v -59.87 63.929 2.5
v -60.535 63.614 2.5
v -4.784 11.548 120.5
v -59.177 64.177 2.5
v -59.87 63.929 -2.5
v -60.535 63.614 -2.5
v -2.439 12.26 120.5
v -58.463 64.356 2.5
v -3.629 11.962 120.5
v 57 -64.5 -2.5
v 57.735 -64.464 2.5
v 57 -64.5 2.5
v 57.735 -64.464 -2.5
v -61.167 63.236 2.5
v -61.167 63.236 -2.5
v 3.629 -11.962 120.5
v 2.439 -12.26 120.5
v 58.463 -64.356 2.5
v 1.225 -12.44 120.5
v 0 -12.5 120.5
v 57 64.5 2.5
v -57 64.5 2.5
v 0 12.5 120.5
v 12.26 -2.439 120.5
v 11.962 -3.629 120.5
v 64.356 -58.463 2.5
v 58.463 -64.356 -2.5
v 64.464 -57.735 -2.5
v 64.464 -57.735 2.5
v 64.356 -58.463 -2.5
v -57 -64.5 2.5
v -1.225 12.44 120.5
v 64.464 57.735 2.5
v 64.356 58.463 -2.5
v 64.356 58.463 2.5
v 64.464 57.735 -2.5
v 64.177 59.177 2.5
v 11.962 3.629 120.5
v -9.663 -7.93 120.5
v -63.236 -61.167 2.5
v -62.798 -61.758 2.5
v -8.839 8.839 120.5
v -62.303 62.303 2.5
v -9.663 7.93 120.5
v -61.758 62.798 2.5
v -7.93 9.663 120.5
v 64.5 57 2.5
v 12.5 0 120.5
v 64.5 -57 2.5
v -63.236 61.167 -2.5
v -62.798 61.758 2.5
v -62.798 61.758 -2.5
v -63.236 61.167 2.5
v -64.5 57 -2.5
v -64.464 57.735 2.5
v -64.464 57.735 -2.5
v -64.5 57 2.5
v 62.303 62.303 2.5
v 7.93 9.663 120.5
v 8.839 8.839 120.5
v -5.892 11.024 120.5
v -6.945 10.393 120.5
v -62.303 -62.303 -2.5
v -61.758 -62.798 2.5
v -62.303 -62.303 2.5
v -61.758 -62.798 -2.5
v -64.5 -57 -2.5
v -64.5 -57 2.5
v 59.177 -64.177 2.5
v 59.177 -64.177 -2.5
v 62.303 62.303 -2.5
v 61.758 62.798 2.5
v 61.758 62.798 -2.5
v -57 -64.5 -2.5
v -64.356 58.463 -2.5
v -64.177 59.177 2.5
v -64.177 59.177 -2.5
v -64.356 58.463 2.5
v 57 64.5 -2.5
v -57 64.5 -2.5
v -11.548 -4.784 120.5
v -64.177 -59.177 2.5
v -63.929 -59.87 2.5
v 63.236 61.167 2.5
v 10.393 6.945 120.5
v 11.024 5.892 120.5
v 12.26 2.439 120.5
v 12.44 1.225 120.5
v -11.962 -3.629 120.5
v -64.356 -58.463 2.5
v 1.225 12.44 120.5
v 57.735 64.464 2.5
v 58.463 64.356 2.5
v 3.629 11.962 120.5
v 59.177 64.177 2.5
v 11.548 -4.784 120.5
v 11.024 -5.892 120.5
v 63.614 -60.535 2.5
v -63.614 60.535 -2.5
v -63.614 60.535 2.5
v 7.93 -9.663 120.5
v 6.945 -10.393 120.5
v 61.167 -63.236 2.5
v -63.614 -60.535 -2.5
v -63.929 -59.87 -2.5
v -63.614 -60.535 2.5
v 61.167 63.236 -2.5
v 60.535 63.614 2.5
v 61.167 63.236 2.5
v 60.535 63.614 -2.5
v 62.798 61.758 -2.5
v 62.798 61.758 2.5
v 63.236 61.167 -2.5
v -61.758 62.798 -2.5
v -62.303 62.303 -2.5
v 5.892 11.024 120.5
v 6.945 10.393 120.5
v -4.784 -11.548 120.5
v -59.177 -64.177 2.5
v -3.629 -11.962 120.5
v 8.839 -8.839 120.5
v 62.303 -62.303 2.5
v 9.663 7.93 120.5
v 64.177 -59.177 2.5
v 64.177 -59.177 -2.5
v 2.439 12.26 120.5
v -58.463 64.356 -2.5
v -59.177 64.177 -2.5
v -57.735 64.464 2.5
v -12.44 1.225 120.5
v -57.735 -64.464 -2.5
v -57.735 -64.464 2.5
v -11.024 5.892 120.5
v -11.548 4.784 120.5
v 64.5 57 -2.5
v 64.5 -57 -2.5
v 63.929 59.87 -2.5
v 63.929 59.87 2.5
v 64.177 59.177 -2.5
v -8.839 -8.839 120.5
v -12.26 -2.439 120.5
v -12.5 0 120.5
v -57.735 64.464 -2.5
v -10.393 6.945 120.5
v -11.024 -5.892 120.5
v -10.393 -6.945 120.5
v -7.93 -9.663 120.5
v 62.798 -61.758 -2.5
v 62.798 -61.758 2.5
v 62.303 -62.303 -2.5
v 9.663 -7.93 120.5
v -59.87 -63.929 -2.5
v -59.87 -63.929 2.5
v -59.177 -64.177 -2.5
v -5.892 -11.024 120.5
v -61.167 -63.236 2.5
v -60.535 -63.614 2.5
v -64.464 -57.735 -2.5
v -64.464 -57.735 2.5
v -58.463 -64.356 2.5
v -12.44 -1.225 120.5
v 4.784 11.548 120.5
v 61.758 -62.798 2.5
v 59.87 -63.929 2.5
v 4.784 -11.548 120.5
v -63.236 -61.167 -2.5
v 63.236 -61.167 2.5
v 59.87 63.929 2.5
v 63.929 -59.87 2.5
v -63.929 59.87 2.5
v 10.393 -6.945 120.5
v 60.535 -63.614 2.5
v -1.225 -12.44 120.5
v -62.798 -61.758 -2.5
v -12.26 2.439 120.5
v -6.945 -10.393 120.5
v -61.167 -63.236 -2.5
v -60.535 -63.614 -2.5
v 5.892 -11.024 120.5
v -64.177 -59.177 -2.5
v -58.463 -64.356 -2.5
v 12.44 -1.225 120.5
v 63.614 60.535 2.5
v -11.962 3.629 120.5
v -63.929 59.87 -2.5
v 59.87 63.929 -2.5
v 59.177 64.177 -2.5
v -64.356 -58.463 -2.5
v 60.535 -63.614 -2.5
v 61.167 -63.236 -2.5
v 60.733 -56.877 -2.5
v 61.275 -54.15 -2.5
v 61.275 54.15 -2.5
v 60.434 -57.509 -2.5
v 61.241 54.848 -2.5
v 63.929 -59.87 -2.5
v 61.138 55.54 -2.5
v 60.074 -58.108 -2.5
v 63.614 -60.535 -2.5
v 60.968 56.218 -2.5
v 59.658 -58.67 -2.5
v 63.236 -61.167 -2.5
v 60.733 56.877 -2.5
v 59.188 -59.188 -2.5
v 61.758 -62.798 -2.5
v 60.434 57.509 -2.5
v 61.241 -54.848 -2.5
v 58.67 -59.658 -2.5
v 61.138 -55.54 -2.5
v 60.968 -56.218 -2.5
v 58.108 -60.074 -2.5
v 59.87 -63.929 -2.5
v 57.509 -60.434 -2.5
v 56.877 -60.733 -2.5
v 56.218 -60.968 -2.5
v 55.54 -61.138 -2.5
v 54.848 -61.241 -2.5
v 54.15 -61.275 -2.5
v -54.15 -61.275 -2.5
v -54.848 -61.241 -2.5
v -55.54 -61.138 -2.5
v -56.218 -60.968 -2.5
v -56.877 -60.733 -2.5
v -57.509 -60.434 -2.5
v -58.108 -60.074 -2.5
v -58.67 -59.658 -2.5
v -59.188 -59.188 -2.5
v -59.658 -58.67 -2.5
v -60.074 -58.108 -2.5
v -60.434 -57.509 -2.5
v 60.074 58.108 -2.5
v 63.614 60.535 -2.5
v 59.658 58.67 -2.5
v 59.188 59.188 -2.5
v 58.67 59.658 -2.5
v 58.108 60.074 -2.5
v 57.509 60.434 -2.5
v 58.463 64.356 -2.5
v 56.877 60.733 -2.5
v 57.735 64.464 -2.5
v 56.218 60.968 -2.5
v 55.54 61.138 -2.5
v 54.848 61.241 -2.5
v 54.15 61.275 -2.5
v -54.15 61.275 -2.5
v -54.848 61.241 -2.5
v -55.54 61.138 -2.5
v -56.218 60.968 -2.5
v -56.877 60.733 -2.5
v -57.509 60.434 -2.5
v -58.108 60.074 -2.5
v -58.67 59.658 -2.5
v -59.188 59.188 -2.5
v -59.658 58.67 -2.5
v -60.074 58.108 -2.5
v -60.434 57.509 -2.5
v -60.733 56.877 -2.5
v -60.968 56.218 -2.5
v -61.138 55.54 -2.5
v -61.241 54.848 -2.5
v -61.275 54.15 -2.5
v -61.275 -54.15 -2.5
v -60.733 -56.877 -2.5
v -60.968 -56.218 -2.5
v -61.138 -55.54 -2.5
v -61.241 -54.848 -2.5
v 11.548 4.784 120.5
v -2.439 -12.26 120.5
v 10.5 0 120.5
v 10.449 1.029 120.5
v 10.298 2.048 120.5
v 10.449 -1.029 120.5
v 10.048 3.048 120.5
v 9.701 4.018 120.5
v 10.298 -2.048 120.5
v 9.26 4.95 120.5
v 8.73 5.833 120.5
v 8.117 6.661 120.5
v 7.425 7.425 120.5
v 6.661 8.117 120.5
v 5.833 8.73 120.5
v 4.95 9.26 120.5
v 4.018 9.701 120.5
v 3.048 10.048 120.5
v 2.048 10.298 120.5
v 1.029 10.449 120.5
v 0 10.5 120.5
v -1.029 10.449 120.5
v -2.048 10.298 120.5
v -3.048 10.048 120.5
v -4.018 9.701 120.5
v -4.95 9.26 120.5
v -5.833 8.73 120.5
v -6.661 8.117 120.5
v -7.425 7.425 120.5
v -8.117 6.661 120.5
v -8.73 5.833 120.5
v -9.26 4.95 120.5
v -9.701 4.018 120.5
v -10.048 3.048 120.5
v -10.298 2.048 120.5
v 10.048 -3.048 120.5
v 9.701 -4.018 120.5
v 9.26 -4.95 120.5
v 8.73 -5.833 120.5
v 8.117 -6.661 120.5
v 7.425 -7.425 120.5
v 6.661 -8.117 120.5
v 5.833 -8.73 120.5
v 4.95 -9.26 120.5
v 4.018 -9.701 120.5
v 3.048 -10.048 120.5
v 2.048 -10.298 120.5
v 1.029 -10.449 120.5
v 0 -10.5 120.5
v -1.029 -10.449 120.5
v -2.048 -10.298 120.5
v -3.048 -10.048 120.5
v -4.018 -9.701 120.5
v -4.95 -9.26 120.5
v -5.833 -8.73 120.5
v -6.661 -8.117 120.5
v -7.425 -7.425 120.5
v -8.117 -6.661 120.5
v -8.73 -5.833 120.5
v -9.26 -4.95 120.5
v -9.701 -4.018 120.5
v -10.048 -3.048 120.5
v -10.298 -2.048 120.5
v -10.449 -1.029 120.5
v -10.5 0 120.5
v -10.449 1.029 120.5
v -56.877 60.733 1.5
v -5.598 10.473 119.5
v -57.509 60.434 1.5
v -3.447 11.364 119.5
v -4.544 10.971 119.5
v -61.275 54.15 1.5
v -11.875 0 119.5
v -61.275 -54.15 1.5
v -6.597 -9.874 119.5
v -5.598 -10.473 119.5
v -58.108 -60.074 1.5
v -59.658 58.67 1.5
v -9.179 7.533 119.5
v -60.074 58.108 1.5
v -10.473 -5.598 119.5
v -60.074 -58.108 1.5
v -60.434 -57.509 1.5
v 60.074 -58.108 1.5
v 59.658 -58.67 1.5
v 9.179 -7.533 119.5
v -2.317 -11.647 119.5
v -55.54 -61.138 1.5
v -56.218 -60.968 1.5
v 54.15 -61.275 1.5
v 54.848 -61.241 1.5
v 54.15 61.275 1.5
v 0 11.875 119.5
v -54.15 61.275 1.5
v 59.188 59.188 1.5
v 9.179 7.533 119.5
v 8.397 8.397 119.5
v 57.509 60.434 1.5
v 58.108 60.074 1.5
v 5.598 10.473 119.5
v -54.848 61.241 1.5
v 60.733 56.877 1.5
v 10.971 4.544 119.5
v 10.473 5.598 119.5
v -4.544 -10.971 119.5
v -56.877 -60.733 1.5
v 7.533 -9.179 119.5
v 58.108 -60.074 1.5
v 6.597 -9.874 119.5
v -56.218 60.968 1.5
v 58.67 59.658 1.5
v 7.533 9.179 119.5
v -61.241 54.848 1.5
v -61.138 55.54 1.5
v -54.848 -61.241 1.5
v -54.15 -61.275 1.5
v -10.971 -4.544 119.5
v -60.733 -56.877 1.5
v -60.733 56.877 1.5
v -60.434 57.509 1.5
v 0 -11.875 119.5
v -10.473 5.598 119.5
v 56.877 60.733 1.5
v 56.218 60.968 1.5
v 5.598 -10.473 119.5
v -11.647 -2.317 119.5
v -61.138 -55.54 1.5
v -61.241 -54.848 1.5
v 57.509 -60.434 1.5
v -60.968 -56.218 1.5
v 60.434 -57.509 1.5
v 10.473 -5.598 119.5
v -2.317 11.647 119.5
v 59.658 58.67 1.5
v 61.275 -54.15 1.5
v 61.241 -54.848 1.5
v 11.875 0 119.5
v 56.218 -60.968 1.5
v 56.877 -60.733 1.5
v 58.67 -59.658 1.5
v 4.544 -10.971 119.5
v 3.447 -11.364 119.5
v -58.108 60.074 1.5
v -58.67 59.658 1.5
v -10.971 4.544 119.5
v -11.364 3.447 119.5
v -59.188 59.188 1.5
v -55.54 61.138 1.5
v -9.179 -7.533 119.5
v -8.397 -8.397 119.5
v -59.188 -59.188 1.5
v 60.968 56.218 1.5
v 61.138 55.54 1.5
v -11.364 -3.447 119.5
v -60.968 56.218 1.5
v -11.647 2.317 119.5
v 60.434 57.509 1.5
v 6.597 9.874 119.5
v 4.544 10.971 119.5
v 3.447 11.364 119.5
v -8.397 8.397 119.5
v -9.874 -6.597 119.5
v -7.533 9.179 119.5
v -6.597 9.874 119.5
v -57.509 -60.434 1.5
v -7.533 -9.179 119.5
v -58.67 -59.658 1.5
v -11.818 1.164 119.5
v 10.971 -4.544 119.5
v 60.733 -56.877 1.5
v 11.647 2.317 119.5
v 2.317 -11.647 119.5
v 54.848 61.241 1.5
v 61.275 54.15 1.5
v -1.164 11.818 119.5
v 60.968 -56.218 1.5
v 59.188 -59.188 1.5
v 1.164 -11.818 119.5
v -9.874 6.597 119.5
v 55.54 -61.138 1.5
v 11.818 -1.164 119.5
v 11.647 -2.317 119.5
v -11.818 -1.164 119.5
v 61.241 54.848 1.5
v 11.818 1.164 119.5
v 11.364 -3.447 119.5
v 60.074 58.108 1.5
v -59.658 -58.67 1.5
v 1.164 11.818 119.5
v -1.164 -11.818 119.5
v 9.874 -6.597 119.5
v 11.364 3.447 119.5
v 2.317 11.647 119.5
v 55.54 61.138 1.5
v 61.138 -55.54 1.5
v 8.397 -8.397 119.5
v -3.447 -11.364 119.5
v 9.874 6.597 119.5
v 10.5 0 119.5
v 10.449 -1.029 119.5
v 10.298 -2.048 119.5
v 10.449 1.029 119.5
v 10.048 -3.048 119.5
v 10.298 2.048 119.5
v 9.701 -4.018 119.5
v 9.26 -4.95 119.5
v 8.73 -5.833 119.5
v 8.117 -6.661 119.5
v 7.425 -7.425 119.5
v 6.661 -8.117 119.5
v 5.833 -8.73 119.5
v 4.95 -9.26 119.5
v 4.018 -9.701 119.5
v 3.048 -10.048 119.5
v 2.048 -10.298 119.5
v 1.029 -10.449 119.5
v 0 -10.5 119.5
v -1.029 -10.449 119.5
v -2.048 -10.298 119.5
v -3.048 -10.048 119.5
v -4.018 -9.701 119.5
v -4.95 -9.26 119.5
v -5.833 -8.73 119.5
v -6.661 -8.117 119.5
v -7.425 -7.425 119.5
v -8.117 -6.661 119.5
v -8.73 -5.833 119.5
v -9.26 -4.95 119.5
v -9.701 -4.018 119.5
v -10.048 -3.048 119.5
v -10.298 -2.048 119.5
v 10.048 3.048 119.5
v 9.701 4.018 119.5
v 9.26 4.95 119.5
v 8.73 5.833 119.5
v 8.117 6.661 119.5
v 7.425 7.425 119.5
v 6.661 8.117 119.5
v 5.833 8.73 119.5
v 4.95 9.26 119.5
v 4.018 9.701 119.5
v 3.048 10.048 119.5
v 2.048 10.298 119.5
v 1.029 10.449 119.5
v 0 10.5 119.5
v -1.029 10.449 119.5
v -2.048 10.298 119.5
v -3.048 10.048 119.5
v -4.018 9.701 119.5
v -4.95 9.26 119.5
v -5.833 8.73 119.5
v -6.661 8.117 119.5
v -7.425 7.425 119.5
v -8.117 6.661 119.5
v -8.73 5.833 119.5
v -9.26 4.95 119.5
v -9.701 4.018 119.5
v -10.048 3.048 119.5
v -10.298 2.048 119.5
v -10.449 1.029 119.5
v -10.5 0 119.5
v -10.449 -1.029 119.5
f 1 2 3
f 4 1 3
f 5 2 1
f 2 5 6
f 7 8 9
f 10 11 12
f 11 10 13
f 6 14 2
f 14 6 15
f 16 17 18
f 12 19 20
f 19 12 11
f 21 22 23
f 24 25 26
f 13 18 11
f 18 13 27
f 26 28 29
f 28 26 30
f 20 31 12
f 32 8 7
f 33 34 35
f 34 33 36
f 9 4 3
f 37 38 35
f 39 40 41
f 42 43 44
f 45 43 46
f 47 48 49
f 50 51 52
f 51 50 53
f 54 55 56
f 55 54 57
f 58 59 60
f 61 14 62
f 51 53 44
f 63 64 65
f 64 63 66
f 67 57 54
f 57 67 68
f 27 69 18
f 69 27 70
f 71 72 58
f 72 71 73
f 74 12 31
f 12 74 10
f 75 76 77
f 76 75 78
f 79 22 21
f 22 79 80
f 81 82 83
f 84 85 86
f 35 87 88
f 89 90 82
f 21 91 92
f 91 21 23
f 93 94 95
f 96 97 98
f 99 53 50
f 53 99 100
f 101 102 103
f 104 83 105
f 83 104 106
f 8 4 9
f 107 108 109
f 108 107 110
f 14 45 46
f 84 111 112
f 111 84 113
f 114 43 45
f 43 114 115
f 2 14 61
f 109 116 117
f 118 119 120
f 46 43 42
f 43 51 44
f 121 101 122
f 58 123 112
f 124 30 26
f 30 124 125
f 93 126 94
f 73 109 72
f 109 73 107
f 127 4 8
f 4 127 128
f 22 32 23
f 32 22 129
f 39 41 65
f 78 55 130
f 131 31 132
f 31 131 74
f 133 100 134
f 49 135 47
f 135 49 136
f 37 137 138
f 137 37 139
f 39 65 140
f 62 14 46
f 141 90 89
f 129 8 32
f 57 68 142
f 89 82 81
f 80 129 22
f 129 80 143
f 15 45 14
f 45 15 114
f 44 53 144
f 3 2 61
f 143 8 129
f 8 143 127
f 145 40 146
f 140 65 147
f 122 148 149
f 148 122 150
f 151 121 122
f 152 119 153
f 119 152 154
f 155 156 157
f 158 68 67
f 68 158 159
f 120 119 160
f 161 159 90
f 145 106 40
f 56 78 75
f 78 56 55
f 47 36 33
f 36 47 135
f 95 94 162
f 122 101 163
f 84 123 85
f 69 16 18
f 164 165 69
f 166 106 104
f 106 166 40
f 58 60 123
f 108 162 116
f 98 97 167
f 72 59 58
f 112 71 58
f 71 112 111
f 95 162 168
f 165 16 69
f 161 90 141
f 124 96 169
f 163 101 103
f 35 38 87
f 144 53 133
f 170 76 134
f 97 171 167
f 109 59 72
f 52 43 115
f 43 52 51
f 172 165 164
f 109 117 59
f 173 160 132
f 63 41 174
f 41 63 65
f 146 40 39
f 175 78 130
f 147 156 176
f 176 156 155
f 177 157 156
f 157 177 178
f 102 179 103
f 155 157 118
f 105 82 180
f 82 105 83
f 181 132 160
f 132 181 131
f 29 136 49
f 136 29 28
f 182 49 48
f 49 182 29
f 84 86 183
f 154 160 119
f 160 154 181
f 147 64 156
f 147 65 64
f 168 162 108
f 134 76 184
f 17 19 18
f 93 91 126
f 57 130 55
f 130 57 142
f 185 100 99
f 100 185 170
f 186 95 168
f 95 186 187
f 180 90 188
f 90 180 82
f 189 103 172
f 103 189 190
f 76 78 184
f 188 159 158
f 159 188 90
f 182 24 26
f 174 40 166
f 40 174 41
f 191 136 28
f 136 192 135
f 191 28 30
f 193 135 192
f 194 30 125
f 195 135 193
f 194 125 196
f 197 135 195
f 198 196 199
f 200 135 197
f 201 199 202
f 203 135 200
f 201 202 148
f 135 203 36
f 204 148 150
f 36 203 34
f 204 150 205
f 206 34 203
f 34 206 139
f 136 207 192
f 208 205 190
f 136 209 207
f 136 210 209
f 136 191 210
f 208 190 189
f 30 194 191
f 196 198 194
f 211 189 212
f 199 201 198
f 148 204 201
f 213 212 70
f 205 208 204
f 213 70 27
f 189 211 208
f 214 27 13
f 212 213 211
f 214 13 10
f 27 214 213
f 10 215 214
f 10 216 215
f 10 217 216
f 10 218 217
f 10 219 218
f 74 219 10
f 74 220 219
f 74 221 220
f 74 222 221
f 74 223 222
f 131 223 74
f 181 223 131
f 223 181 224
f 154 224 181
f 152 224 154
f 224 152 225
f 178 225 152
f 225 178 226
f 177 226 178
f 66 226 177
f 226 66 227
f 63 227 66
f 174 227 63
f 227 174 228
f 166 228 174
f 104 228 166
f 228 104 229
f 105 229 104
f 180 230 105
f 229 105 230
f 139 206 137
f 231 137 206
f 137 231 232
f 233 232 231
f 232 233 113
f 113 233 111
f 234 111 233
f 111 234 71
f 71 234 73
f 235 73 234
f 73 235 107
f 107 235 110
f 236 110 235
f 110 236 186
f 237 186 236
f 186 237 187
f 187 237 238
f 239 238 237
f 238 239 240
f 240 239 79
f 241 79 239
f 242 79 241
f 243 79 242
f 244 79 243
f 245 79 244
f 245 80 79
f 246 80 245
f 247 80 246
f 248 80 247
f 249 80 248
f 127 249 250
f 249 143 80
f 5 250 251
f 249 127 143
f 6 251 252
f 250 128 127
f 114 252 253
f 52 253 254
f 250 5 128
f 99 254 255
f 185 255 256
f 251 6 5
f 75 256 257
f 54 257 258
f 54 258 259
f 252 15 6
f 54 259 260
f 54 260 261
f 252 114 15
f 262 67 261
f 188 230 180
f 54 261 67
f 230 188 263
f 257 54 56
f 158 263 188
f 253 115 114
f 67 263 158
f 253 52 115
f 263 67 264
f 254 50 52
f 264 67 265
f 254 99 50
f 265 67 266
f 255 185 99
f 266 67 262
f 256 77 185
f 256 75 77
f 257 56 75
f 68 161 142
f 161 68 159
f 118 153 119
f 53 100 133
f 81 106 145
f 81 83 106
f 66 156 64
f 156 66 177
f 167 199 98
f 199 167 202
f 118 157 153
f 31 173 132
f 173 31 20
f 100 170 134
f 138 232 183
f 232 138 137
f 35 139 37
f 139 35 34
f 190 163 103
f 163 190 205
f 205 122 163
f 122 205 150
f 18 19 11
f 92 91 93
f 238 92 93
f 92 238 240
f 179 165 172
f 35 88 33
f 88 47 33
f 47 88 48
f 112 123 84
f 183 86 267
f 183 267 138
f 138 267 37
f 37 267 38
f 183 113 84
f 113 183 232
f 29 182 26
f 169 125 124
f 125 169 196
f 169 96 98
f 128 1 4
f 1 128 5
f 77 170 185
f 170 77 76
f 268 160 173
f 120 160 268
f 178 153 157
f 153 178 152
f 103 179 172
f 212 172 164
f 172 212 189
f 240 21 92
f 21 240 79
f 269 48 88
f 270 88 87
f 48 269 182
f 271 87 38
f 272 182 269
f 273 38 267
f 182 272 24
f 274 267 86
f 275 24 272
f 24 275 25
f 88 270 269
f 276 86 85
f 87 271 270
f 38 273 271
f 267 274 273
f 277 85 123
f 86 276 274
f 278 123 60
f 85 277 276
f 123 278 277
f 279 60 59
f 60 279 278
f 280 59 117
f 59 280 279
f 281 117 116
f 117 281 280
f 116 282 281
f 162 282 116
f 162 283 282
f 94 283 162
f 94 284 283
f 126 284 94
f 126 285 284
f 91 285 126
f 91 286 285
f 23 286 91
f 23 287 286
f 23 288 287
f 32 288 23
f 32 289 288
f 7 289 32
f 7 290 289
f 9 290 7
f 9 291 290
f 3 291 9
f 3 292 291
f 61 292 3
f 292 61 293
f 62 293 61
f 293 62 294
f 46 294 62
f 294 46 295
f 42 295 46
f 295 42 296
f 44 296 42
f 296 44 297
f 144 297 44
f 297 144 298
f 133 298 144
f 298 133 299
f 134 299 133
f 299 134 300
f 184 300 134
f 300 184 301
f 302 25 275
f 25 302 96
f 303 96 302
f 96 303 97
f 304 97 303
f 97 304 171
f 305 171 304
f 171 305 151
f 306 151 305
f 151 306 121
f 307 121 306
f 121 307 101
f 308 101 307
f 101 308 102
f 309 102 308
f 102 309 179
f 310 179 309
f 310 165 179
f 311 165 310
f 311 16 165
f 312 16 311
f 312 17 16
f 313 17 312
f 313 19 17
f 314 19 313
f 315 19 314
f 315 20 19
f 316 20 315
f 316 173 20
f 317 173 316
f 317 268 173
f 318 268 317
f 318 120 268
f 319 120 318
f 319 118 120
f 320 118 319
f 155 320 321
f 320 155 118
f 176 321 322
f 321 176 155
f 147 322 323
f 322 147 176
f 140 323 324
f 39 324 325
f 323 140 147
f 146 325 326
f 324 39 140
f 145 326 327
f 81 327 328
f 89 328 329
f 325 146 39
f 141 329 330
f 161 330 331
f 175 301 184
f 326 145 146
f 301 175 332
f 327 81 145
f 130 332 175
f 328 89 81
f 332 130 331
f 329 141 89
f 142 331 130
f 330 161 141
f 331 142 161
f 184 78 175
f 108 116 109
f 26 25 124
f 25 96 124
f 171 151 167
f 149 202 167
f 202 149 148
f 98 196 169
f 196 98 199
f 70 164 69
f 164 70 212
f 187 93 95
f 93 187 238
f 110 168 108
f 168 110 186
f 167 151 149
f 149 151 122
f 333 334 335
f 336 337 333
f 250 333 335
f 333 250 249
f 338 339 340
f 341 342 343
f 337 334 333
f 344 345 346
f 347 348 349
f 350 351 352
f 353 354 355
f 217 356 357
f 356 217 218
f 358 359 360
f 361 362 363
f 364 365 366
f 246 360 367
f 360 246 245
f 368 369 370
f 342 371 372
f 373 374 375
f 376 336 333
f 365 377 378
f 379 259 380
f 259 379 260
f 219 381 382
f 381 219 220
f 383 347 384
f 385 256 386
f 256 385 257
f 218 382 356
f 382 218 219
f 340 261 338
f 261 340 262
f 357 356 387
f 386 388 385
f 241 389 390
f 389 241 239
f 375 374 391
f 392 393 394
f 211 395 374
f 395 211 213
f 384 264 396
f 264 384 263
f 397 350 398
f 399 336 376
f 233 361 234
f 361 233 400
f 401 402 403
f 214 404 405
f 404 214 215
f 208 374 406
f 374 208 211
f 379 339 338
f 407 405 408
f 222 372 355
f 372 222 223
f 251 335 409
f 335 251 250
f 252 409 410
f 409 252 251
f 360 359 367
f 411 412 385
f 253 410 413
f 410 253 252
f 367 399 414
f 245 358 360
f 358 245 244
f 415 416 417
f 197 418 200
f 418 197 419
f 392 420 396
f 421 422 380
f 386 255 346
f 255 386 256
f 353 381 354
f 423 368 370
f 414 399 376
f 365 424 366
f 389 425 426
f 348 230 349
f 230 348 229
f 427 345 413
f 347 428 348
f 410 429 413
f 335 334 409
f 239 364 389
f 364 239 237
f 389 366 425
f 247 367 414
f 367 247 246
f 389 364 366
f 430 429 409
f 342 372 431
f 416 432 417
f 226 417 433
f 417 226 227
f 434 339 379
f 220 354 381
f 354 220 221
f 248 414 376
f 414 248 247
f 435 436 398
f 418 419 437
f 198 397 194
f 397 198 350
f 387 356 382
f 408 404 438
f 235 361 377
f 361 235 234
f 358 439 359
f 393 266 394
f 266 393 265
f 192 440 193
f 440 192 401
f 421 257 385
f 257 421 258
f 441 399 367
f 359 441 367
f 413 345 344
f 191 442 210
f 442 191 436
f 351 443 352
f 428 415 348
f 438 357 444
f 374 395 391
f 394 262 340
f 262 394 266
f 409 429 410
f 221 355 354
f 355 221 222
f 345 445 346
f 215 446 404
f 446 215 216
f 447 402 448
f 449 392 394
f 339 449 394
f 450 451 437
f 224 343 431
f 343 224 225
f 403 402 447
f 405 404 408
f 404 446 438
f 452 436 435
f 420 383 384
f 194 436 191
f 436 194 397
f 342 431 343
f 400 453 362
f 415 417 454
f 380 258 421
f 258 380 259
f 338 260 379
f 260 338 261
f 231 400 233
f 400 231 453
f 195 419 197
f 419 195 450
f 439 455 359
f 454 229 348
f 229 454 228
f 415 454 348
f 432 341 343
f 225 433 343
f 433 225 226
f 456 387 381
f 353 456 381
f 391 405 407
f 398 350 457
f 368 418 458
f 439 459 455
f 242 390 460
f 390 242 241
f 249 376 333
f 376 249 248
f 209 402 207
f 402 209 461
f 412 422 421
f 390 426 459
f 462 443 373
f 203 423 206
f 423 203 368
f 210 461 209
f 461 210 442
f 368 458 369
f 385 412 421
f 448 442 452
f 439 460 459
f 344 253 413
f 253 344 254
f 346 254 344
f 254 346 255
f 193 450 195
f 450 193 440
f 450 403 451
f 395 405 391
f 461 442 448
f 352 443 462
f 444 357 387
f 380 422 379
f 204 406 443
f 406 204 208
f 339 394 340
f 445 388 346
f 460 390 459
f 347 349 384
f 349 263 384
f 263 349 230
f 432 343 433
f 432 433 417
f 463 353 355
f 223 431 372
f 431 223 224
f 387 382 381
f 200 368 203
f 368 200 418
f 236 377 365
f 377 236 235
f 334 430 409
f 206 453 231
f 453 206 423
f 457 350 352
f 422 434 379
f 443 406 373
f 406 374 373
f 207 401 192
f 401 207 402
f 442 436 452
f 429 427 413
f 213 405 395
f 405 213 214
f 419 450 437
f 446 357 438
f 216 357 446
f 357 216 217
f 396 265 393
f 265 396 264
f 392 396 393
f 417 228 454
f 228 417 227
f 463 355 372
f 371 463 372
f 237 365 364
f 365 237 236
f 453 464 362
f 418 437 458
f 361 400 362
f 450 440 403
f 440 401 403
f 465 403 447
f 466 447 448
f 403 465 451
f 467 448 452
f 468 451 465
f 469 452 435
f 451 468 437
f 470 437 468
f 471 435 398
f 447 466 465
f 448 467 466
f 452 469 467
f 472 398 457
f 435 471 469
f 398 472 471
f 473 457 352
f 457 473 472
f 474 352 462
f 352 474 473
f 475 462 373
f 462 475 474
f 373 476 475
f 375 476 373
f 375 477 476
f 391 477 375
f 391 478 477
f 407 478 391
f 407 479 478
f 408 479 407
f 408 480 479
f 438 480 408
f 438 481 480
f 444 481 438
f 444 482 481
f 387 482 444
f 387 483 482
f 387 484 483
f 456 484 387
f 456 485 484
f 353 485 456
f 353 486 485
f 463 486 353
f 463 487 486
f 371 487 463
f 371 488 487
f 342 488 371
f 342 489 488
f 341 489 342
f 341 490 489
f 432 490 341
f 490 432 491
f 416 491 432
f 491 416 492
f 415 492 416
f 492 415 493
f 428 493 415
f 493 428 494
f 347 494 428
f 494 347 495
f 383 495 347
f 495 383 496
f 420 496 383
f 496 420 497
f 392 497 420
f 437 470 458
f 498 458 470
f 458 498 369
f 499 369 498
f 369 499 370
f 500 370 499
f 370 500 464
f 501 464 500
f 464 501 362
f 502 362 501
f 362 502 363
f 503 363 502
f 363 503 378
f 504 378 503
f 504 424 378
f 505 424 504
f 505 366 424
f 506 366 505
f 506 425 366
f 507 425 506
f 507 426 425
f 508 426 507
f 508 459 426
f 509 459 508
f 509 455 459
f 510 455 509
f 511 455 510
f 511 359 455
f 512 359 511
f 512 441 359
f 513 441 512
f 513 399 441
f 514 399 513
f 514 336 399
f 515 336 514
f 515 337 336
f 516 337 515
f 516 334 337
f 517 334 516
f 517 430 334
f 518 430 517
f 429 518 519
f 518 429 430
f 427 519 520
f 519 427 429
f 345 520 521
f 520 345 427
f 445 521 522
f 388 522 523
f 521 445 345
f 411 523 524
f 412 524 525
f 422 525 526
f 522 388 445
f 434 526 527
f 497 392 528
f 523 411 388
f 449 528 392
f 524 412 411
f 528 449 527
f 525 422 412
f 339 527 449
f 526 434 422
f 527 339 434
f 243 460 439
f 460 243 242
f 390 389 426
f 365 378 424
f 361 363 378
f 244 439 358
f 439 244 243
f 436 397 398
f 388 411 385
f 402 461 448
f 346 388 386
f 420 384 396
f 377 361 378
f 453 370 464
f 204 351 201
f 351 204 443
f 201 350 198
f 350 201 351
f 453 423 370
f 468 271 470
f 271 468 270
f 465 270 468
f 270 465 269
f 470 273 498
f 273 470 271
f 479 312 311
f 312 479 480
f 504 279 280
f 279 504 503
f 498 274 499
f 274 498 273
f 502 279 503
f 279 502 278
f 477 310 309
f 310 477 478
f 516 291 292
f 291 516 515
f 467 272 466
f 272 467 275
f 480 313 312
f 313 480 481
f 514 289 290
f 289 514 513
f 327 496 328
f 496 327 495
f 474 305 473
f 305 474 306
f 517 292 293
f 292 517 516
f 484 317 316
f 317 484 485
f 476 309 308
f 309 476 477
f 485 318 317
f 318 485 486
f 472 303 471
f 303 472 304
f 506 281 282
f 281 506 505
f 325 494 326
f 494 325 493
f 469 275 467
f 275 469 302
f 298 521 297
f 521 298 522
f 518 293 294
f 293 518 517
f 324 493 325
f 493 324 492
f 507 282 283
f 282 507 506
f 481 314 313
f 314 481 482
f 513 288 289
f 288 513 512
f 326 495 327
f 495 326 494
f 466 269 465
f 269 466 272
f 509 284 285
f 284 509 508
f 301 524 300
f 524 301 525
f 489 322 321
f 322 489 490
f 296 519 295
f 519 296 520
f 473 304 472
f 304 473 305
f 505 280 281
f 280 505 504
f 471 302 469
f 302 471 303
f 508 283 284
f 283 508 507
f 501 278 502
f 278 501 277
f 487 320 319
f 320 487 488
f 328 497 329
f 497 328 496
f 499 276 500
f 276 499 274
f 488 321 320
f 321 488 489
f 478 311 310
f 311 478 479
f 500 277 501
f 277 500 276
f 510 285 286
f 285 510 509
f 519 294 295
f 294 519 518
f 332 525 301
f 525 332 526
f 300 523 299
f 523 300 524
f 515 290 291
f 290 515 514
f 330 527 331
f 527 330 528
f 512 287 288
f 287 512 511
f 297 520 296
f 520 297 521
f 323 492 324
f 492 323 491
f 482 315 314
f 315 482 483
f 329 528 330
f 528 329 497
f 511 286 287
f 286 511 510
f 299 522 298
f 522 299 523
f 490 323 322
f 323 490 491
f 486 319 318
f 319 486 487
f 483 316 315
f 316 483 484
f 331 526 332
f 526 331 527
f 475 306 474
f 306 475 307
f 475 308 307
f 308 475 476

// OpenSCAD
$fn = 64;
round_corner = 15;

nozzle_kit();

module nozzle_kit() {
    difference() {
        nozzle();
        translate([0,0,-1])
        scale([0.95, 0.95, 1])
        color("red")
        nozzle();
        translate([0,0,120])
        cylinder(d=25-4, h=15, center = true);
    }
}
module nozzle(){
    hull() {
        frame_square();
        translate([0, 0, 120])
        frame_ring();
    }
}

//hull() {
//    frame_square();
//    translate([0, 0, 120])
//    cylinder(d=25, h=1, center = true);
//}

module frame_ring() {
    difference() {
        cylinder(d=25, h=1, center = true);
        color("red")
        cylinder(d=25-6, h=6, center = true);
    }
}

module frame_square() {
    difference() {
        square_plate();
        translate([0, 0, 1])
        color("red")
        scale([0.95, 0.95, 4])
        square_plate();
    }
}

module square_plate(){ 
    hull() {
        //cube([129-round_corner, 129, 1], center = true);
        translate([129/2-round_corner/2, 129/2-round_corner/2, 0])
        color("red")
        cylinder(d = round_corner, h = 5, center = true);
        
        mirror([1, 0, 0])
        translate([129/2-round_corner/2, 129/2-round_corner/2, 0])
        color("red")
        cylinder(d = round_corner, h = 5, center = true);
        
        mirror([0, 1, 0])
        translate([129/2-round_corner/2, 129/2-round_corner/2, 0])
        color("red")
        cylinder(d = round_corner, h = 5, center = true);
        
        mirror([1, 1, 0])
        translate([129/2-round_corner/2, 129/2-round_corner/2, 0])
        color("red")
        cylinder(d = round_corner, h = 5, center = true);
    }
}
